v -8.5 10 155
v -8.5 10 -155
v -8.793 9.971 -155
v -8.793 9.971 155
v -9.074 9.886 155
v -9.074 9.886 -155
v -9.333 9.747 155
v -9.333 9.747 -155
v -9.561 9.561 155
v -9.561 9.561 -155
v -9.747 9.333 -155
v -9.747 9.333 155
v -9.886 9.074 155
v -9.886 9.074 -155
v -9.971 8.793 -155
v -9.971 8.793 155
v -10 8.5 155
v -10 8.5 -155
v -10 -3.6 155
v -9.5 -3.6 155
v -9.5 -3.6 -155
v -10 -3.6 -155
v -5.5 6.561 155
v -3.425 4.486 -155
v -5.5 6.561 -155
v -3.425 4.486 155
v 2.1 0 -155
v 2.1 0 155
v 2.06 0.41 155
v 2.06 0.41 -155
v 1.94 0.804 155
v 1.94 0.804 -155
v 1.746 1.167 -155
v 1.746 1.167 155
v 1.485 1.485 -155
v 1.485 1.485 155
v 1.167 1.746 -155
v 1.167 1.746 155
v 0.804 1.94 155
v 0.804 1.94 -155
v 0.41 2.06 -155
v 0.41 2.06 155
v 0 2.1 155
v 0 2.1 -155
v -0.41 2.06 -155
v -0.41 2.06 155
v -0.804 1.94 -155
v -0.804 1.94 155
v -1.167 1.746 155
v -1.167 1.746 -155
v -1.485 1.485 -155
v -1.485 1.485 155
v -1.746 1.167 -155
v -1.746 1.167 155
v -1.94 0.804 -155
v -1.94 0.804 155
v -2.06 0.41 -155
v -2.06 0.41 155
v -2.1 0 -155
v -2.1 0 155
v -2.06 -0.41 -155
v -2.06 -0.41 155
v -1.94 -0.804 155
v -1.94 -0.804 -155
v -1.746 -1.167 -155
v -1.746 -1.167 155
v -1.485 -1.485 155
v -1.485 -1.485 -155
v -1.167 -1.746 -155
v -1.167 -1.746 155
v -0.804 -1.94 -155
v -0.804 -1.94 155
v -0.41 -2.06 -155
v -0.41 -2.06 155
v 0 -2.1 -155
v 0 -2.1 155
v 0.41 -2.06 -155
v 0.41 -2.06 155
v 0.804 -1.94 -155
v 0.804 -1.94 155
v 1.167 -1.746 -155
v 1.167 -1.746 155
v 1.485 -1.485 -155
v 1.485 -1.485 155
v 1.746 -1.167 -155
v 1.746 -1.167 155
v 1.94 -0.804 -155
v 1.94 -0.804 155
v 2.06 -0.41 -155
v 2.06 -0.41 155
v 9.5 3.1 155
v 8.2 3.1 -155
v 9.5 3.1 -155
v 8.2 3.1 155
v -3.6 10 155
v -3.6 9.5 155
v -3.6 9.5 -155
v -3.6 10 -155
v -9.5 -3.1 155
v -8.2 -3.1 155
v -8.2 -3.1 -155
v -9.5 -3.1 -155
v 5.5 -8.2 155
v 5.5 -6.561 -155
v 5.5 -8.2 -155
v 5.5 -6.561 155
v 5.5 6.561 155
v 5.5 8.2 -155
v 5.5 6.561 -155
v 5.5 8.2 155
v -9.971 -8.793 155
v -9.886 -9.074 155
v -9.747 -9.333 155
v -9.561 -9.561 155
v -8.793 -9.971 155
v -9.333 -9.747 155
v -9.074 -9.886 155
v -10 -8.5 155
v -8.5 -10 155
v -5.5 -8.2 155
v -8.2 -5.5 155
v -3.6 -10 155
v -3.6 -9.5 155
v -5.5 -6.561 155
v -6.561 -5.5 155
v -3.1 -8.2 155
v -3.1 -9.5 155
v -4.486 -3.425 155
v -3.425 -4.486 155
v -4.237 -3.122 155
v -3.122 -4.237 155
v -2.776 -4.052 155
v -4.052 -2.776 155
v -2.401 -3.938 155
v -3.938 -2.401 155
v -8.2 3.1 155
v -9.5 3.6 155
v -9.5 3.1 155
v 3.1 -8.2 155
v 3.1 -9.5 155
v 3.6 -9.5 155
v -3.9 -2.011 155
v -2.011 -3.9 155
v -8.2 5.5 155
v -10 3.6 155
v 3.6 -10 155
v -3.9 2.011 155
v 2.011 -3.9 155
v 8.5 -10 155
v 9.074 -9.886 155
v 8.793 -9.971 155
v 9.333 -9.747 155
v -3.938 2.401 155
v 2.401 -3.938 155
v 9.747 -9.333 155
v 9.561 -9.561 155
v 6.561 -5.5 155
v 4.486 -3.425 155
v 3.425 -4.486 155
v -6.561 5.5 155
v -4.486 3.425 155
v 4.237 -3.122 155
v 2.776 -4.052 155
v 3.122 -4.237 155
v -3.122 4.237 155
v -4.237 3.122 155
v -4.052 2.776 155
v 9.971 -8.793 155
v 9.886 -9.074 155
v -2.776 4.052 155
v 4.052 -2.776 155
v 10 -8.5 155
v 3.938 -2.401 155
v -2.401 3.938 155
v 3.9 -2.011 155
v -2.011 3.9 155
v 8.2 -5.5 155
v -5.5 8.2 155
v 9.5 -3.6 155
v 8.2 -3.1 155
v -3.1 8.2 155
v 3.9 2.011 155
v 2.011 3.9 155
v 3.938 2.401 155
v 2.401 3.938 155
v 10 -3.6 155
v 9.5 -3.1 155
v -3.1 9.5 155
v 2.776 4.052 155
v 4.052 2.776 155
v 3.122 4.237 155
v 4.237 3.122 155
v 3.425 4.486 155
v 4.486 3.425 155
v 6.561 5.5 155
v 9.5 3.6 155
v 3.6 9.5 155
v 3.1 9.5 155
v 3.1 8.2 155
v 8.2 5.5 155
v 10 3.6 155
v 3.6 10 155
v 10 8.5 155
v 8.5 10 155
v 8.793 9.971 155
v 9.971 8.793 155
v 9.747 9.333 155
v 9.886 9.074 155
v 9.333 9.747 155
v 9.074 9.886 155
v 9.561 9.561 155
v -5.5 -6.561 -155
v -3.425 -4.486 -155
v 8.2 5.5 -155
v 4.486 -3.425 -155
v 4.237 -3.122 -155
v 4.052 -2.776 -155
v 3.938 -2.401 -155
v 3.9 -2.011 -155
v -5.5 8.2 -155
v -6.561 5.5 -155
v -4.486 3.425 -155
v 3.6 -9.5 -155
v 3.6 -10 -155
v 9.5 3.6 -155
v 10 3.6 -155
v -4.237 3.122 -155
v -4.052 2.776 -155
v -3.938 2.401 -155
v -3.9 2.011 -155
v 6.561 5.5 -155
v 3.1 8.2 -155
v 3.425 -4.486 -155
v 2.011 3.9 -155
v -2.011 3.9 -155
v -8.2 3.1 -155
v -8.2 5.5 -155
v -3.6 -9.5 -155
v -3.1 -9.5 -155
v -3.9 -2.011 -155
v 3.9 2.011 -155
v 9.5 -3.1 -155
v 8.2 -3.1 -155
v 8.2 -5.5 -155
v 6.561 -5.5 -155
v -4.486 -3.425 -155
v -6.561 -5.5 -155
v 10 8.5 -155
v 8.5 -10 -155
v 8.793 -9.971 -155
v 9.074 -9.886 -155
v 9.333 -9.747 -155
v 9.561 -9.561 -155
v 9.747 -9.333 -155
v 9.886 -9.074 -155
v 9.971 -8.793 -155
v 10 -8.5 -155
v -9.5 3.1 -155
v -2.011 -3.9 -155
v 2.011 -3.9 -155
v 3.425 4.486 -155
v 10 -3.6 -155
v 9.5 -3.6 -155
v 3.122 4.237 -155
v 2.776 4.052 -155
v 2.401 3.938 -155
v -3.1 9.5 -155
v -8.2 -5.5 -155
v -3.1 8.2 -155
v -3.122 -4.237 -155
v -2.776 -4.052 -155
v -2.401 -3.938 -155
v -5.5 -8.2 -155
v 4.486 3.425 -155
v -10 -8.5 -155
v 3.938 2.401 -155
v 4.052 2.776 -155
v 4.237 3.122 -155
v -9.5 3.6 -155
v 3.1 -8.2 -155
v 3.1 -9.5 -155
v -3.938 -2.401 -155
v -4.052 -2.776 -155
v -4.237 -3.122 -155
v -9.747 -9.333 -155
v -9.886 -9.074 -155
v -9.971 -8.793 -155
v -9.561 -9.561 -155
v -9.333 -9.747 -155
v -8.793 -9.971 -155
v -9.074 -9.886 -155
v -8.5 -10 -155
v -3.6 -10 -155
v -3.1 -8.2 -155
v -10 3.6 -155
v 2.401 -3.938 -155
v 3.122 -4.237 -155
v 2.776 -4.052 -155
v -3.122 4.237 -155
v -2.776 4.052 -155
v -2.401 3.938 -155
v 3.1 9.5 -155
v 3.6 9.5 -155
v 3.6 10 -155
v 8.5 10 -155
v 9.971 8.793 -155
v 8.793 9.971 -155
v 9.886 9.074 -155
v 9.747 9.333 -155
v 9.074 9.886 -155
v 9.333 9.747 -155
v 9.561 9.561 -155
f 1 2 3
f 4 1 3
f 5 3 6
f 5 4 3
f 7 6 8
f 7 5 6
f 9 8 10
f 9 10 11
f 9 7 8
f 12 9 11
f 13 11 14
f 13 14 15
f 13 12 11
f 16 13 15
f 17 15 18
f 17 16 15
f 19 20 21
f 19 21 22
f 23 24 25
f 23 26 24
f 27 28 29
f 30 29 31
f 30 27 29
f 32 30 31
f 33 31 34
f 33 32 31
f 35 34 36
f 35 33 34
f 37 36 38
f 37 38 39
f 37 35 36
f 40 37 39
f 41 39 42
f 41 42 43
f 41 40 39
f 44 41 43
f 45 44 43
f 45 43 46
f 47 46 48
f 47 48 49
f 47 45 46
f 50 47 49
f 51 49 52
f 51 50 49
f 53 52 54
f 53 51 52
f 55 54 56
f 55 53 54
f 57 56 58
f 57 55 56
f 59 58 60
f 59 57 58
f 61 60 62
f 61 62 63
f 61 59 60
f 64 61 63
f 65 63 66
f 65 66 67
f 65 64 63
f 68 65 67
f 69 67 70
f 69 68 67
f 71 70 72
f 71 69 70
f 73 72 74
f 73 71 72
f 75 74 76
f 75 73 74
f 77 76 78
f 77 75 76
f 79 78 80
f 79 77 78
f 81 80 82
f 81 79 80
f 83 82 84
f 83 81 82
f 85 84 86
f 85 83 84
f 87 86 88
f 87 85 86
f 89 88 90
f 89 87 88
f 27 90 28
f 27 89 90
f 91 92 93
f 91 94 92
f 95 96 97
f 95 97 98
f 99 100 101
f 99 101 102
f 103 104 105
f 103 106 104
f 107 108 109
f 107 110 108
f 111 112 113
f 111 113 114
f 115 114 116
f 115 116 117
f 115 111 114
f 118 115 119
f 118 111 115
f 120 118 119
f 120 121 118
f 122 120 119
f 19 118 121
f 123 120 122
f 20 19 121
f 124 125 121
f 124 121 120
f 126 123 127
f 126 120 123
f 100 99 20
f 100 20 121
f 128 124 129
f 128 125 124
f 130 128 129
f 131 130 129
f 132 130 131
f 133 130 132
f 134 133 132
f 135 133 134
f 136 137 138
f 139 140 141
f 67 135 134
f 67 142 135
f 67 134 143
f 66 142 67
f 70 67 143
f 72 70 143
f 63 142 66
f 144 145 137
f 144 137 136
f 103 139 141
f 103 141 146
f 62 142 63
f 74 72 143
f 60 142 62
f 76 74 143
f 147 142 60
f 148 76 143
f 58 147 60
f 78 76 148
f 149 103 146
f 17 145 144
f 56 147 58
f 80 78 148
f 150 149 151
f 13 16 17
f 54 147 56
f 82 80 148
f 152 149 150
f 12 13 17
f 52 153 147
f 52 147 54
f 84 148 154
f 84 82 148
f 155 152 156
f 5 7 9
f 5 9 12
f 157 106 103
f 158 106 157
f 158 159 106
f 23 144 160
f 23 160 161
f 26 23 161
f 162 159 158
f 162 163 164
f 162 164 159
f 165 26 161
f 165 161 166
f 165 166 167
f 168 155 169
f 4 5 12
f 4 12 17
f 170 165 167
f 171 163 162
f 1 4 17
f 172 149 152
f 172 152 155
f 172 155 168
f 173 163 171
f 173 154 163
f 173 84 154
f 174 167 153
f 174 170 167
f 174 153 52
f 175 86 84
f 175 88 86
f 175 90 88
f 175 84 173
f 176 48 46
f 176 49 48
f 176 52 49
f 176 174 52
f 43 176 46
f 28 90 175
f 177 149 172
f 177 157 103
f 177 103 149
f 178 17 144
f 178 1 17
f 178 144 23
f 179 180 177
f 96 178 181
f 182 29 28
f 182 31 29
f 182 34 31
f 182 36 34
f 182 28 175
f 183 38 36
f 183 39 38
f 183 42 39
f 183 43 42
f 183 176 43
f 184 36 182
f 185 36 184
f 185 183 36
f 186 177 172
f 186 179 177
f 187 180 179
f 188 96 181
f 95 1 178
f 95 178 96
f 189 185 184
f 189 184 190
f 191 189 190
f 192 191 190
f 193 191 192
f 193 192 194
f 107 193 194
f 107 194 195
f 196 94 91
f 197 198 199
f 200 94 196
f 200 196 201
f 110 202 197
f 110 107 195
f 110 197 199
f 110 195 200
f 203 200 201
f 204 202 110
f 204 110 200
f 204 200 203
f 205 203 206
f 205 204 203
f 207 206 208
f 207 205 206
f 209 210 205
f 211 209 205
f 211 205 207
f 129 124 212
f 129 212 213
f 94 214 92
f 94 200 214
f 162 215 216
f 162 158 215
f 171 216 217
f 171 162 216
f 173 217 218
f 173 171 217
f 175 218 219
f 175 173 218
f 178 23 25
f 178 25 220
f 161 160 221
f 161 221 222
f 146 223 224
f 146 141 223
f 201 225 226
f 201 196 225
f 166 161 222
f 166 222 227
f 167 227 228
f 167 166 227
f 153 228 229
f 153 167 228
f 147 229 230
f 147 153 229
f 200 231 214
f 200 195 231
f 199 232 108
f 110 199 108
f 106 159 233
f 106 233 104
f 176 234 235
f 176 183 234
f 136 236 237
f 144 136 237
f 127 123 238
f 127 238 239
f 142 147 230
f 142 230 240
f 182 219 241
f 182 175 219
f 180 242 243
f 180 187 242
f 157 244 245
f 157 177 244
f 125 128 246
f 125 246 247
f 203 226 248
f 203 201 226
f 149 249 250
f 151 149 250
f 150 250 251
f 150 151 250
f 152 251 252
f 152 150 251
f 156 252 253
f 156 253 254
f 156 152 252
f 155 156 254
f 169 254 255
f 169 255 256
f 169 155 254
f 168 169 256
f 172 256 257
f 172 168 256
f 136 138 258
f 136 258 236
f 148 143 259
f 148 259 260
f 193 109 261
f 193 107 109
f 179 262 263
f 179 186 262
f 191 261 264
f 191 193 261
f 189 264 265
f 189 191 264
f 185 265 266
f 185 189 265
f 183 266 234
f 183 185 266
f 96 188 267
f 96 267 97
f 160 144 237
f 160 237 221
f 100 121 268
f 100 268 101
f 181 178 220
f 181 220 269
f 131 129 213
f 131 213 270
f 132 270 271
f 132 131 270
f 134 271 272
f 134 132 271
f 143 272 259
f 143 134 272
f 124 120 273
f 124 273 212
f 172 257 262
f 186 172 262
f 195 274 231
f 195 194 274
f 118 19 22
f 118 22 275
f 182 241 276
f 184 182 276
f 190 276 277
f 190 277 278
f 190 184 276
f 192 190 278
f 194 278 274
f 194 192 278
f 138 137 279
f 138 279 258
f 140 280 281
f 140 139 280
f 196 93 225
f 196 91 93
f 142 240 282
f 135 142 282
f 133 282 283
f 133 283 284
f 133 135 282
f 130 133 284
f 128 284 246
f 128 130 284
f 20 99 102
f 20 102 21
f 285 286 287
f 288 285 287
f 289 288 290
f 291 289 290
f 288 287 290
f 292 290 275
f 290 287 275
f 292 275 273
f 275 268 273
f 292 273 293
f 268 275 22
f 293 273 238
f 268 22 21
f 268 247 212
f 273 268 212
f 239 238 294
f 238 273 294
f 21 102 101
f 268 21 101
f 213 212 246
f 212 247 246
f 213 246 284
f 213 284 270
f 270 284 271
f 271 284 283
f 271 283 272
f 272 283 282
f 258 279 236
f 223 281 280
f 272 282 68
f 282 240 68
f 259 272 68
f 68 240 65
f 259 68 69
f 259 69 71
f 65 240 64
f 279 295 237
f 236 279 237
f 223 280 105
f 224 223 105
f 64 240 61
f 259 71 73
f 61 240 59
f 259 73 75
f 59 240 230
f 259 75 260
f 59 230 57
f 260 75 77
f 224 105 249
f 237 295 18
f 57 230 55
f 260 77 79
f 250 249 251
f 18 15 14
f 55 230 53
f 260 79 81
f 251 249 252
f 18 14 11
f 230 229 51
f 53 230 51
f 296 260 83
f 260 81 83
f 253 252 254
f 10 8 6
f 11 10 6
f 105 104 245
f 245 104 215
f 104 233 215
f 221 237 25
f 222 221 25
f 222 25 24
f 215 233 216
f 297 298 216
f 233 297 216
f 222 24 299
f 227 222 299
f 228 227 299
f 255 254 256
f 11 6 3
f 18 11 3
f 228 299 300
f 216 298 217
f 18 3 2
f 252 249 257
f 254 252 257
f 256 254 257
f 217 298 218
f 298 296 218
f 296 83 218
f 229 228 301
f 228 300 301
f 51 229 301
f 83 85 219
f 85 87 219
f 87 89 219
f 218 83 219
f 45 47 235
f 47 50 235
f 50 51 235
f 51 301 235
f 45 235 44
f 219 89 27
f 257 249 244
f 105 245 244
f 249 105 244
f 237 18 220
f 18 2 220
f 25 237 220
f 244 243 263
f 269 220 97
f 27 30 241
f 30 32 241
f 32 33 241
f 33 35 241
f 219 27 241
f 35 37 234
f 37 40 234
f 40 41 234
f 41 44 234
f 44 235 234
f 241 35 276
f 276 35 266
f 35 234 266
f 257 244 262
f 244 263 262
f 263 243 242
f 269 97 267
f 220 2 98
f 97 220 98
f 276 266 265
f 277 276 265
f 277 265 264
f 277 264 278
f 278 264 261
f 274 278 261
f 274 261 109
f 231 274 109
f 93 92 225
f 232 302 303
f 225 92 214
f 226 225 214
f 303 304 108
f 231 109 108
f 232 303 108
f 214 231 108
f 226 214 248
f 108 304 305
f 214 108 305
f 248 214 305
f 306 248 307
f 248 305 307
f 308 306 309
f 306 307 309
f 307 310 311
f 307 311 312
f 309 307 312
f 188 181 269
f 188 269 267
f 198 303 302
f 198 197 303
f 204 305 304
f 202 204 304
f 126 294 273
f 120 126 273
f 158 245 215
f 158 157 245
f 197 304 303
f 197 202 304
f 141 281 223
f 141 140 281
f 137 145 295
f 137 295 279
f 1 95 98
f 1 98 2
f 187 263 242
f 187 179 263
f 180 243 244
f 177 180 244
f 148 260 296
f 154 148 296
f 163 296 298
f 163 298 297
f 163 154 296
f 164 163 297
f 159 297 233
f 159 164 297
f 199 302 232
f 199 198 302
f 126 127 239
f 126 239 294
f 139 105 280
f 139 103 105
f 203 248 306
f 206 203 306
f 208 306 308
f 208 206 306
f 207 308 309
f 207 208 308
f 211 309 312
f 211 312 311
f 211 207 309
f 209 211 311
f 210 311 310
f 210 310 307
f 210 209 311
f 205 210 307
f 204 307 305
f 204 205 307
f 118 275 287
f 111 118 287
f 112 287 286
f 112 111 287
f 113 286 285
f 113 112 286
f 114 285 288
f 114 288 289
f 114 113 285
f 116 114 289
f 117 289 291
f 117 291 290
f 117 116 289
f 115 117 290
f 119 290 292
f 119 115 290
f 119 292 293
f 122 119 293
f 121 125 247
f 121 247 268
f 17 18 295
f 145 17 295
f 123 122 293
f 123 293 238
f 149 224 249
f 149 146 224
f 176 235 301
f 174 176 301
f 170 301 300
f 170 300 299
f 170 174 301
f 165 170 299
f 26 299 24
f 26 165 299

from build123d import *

# Parameters (mm, degrees)
SKETCH_1_R      = 2.1
EXTRUDE_1_DEPTH = 155


with BuildPart() as part:
    # 草图1 → 凸台-拉伸1 (new body, symmetric)
    with BuildSketch(Plane.XY):
        with BuildLine():
            Line((-3.425126266, 4.485786438), (-5.5, 6.560660172))
            Line((-5.5, 6.560660172), (-5.5, 8.2))
            Line((-5.5, 8.2), (-3.1, 8.2))
            Line((-3.1, 8.2), (-3.1, 9.5))
            Line((-3.1, 9.5), (-3.6, 9.5))
            Line((-3.6, 9.5), (-3.6, 10))
            Line((-3.6, 10), (-8.5, 10))
            ThreePointArc((-8.5, 10), (-9.560660172, 9.560660172), (-10, 8.5))
            Line((-10, 8.5), (-10, 3.6))
            Line((-10, 3.6), (-9.5, 3.6))
            Line((-9.5, 3.6), (-9.5, 3.1))
            Line((-9.5, 3.1), (-8.2, 3.1))
            Line((-8.2, 3.1), (-8.2, 5.5))
            Line((-8.2, 5.5), (-6.560660172, 5.5))
            Line((-6.560660172, 5.5), (-4.485786438, 3.425126266))
            ThreePointArc((-4.485786438, 3.425126266), (-4.052240935, 2.776279568), (-3.9, 2.010912703))
            Line((-3.9, 2.010912703), (-3.9, -2.010912703))
            ThreePointArc((-3.9, -2.010912703), (-4.052240935, -2.776279568), (-4.485786438, -3.425126266))
            Line((-4.485786438, -3.425126266), (-6.560660172, -5.5))
            Line((-6.560660172, -5.5), (-8.2, -5.5))
            Line((-8.2, -5.5), (-8.2, -3.1))
            Line((-8.2, -3.1), (-9.5, -3.1))
            Line((-9.5, -3.1), (-9.5, -3.6))
            Line((-9.5, -3.6), (-10, -3.6))
            Line((-10, -3.6), (-10, -8.5))
            ThreePointArc((-10, -8.5), (-9.560660172, -9.560660172), (-8.5, -10))
            Line((-8.5, -10), (-3.6, -10))
            Line((-3.6, -10), (-3.6, -9.5))
            Line((-3.6, -9.5), (-3.1, -9.5))
            Line((-3.1, -9.5), (-3.1, -8.2))
            Line((-3.1, -8.2), (-5.5, -8.2))
            Line((-5.5, -8.2), (-5.5, -6.560660172))
            Line((-5.5, -6.560660172), (-3.425126266, -4.485786438))
            ThreePointArc((-3.425126266, -4.485786438), (-2.776279568, -4.052240935), (-2.010912703, -3.9))
            Line((-2.010912703, -3.9), (2.010912703, -3.9))
            ThreePointArc((2.010912703, -3.9), (2.776279568, -4.052240935), (3.425126266, -4.485786438))
            Line((3.425126266, -4.485786438), (5.5, -6.560660172))
            Line((5.5, -6.560660172), (5.5, -8.2))
            Line((5.5, -8.2), (3.1, -8.2))
            Line((3.1, -8.2), (3.1, -9.5))
            Line((3.1, -9.5), (3.6, -9.5))
            Line((3.6, -9.5), (3.6, -10))
            Line((3.6, -10), (8.5, -10))
            ThreePointArc((8.5, -10), (9.560660172, -9.560660172), (10, -8.5))
            Line((10, -8.5), (10, -3.6))
            Line((10, -3.6), (9.5, -3.6))
            Line((9.5, -3.6), (9.5, -3.1))
            Line((9.5, -3.1), (8.2, -3.1))
            Line((8.2, -3.1), (8.2, -5.5))
            Line((8.2, -5.5), (6.560660172, -5.5))
            Line((6.560660172, -5.5), (4.485786438, -3.425126266))
            ThreePointArc((4.485786438, -3.425126266), (4.052240935, -2.776279568), (3.9, -2.010912703))
            Line((3.9, -2.010912703), (3.9, 2.010912703))
            ThreePointArc((3.9, 2.010912703), (4.052240935, 2.776279568), (4.485786438, 3.425126266))
            Line((4.485786438, 3.425126266), (6.560660172, 5.5))
            Line((6.560660172, 5.5), (8.2, 5.5))
            Line((8.2, 5.5), (8.2, 3.1))
            Line((8.2, 3.1), (9.5, 3.1))
            Line((9.5, 3.1), (9.5, 3.6))
            Line((9.5, 3.6), (10, 3.6))
            Line((10, 3.6), (10, 8.5))
            ThreePointArc((10, 8.5), (9.560660172, 9.560660172), (8.5, 10))
            Line((8.5, 10), (3.6, 10))
            Line((3.6, 10), (3.6, 9.5))
            Line((3.6, 9.5), (3.1, 9.5))
            Line((3.1, 9.5), (3.1, 8.2))
            Line((3.1, 8.2), (5.5, 8.2))
            Line((5.5, 8.2), (5.5, 6.560660172))
            Line((5.5, 6.560660172), (3.425126266, 4.485786438))
            ThreePointArc((3.425126266, 4.485786438), (2.776279568, 4.052240935), (2.010912703, 3.9))
            Line((2.010912703, 3.9), (-2.010912703, 3.9))
            ThreePointArc((-2.010912703, 3.9), (-2.776279568, 4.052240935), (-3.425126266, 4.485786438))
        make_face()
        Circle(SKETCH_1_R, mode=Mode.SUBTRACT)
    extrude(amount=EXTRUDE_1_DEPTH, both=True)


solid = part.part
